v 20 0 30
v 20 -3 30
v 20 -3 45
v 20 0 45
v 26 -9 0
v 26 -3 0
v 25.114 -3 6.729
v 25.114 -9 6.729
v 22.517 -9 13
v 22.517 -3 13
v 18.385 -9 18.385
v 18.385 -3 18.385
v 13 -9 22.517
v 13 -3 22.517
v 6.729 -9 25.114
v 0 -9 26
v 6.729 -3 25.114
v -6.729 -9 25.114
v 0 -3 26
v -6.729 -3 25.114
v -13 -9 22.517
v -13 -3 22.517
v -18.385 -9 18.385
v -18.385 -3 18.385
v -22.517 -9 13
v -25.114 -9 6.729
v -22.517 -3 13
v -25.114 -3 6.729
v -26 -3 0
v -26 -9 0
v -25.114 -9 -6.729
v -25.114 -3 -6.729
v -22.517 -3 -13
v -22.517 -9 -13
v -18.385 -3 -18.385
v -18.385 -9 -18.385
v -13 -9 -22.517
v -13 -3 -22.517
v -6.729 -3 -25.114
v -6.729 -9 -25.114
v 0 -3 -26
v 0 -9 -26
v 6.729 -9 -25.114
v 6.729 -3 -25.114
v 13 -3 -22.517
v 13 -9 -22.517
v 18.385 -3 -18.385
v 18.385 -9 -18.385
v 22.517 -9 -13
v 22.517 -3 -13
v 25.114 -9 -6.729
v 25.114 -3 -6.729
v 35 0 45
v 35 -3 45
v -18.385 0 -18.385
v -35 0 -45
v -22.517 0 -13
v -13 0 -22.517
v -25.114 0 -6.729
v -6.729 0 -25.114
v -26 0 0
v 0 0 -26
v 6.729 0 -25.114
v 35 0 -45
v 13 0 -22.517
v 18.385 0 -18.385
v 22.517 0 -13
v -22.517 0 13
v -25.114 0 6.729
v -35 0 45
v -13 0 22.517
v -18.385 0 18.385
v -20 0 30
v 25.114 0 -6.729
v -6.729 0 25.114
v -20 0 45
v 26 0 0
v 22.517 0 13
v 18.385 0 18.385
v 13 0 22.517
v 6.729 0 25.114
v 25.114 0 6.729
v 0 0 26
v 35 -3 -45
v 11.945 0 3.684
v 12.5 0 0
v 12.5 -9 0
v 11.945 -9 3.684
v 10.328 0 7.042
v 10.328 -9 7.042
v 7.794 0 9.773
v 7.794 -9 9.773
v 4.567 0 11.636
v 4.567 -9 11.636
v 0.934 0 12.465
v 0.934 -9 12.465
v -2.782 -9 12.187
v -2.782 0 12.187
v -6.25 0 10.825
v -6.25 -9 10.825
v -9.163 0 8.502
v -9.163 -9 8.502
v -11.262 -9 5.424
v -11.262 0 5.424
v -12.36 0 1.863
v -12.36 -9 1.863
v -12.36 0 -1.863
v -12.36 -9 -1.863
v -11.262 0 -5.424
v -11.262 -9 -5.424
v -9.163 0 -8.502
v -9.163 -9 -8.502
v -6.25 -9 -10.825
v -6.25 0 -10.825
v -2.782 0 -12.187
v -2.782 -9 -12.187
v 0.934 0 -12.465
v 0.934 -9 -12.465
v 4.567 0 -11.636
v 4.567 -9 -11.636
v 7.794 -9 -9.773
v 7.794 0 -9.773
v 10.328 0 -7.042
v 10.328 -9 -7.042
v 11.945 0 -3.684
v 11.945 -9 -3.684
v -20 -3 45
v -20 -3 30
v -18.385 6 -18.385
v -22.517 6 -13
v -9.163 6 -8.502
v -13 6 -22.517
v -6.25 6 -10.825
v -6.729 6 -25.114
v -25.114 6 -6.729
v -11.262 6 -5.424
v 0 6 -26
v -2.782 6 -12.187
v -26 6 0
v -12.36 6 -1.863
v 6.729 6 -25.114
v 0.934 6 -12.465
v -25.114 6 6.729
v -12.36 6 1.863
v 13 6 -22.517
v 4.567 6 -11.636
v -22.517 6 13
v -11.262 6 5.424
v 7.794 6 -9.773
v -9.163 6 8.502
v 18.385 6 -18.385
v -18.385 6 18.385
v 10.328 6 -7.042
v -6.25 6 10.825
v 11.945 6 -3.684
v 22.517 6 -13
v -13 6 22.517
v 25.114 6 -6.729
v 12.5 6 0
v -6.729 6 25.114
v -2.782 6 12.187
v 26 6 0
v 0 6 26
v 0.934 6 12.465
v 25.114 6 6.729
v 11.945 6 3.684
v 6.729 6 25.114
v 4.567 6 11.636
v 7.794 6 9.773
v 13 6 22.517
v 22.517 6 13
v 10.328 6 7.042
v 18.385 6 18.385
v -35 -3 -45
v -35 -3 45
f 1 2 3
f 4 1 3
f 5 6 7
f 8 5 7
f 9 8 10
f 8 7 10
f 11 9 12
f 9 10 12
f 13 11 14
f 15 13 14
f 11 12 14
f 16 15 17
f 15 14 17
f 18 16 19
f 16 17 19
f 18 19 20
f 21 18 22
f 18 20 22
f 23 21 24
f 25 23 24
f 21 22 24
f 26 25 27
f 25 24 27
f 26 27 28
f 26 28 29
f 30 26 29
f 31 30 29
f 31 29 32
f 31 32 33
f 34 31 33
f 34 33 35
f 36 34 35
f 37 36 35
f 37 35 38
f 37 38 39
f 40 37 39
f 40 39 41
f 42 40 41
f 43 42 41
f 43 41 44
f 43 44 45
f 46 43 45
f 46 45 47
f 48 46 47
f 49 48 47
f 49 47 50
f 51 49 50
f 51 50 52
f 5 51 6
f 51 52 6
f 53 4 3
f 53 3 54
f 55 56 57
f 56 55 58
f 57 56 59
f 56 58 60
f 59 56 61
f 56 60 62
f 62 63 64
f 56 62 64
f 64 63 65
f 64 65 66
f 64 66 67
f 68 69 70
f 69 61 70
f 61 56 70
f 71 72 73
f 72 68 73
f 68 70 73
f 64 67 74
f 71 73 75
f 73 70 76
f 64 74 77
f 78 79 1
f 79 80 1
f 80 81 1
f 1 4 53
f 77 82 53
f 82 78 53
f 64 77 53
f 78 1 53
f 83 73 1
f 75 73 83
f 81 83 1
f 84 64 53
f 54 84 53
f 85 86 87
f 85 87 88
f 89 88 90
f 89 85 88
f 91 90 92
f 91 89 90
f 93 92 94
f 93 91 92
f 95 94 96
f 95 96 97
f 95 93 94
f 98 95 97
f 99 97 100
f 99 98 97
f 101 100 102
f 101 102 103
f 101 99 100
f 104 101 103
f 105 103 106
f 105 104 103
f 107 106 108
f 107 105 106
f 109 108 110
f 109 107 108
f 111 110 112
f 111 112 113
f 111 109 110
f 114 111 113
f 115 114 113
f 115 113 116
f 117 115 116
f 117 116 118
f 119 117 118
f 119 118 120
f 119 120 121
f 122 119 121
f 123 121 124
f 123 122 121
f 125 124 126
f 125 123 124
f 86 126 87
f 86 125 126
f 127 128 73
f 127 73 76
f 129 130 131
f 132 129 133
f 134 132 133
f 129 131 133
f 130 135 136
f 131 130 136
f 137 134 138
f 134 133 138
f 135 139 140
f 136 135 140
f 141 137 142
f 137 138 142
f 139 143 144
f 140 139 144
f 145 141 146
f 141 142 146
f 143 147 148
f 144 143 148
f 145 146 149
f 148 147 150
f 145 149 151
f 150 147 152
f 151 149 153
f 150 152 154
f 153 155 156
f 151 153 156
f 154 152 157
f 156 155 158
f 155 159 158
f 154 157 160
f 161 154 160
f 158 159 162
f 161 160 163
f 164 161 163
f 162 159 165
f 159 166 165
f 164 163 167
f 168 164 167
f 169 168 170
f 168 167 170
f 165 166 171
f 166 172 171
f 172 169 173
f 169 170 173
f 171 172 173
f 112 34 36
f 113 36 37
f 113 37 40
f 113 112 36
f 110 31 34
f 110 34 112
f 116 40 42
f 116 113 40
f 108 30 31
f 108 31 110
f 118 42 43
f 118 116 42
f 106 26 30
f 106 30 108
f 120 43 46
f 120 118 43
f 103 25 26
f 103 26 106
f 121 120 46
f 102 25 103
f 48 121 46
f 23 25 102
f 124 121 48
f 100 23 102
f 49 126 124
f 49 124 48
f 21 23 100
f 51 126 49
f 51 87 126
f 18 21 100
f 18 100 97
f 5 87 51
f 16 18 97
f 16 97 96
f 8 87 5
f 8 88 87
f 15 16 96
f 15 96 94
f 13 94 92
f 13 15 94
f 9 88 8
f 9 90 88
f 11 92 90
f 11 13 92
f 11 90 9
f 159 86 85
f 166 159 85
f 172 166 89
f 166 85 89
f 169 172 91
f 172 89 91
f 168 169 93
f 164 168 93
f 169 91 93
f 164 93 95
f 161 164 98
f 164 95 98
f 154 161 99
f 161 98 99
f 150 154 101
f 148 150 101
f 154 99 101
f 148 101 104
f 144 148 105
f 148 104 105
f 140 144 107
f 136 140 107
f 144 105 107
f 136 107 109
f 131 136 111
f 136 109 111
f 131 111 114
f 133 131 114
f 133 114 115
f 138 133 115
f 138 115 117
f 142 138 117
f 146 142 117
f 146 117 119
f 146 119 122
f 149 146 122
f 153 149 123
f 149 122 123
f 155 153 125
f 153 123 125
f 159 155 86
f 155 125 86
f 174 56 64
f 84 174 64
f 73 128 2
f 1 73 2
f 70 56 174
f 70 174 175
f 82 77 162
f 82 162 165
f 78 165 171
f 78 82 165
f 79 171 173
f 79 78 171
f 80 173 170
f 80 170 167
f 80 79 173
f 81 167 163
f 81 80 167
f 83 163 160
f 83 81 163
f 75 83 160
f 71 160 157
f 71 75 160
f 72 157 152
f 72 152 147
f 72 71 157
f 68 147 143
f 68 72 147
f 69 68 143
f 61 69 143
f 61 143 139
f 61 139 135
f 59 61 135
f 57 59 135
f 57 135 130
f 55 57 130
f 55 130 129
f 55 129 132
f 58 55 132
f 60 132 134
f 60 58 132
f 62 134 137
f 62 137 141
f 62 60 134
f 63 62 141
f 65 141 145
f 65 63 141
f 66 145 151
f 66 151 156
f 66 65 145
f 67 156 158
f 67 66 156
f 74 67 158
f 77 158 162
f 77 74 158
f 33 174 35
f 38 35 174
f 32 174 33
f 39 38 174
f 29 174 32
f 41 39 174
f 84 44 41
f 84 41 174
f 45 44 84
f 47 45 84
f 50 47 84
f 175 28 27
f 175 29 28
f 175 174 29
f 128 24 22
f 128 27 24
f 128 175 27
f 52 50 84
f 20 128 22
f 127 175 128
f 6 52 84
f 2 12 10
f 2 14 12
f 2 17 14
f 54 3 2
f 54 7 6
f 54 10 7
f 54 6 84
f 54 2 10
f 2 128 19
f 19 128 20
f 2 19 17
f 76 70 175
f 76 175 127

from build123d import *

# Parameters (mm, degrees)
F0_W          = 70
F0_H          = 90
F1_DEPTH      = 3
F2_D          = 52
F3_R          = 26
F3_R_2        = 12.5
F4_DEPTH      = 9
F4_DEPTH_BACK = 6
F5_W          = 40
F5_H          = 15
F6_DEPTH      = 25


with BuildPart() as f1:
    # F0 (on Front) → F1 (new body)
    with BuildSketch(Plane.XZ):
        Rectangle(F0_W, F0_H)
    extrude(amount=F1_DEPTH)

    # F2 (through all)
    with Locations(Plane(origin=(0, 0, 0), x_dir=(1, 0, 0), z_dir=(0, 1, 0))):
        with Locations((0, 0)):
            Hole(F2_D / 2)

    # F3 (on Front) → F4 (join, two sides)
    with BuildSketch(Plane.XZ) as f4_sk:
        Circle(F3_R)
        Circle(F3_R_2, mode=Mode.SUBTRACT)
    extrude(amount=F4_DEPTH)
    extrude(f4_sk.sketch, amount=-F4_DEPTH_BACK)

    # F5 (on face) → F6 (cut)
    with BuildSketch(Plane.XZ.offset(3)):
        with Locations((0, 37.5)):
            Rectangle(F5_W, F5_H)
    extrude(amount=-F6_DEPTH, mode=Mode.SUBTRACT)


solid = f1.part
